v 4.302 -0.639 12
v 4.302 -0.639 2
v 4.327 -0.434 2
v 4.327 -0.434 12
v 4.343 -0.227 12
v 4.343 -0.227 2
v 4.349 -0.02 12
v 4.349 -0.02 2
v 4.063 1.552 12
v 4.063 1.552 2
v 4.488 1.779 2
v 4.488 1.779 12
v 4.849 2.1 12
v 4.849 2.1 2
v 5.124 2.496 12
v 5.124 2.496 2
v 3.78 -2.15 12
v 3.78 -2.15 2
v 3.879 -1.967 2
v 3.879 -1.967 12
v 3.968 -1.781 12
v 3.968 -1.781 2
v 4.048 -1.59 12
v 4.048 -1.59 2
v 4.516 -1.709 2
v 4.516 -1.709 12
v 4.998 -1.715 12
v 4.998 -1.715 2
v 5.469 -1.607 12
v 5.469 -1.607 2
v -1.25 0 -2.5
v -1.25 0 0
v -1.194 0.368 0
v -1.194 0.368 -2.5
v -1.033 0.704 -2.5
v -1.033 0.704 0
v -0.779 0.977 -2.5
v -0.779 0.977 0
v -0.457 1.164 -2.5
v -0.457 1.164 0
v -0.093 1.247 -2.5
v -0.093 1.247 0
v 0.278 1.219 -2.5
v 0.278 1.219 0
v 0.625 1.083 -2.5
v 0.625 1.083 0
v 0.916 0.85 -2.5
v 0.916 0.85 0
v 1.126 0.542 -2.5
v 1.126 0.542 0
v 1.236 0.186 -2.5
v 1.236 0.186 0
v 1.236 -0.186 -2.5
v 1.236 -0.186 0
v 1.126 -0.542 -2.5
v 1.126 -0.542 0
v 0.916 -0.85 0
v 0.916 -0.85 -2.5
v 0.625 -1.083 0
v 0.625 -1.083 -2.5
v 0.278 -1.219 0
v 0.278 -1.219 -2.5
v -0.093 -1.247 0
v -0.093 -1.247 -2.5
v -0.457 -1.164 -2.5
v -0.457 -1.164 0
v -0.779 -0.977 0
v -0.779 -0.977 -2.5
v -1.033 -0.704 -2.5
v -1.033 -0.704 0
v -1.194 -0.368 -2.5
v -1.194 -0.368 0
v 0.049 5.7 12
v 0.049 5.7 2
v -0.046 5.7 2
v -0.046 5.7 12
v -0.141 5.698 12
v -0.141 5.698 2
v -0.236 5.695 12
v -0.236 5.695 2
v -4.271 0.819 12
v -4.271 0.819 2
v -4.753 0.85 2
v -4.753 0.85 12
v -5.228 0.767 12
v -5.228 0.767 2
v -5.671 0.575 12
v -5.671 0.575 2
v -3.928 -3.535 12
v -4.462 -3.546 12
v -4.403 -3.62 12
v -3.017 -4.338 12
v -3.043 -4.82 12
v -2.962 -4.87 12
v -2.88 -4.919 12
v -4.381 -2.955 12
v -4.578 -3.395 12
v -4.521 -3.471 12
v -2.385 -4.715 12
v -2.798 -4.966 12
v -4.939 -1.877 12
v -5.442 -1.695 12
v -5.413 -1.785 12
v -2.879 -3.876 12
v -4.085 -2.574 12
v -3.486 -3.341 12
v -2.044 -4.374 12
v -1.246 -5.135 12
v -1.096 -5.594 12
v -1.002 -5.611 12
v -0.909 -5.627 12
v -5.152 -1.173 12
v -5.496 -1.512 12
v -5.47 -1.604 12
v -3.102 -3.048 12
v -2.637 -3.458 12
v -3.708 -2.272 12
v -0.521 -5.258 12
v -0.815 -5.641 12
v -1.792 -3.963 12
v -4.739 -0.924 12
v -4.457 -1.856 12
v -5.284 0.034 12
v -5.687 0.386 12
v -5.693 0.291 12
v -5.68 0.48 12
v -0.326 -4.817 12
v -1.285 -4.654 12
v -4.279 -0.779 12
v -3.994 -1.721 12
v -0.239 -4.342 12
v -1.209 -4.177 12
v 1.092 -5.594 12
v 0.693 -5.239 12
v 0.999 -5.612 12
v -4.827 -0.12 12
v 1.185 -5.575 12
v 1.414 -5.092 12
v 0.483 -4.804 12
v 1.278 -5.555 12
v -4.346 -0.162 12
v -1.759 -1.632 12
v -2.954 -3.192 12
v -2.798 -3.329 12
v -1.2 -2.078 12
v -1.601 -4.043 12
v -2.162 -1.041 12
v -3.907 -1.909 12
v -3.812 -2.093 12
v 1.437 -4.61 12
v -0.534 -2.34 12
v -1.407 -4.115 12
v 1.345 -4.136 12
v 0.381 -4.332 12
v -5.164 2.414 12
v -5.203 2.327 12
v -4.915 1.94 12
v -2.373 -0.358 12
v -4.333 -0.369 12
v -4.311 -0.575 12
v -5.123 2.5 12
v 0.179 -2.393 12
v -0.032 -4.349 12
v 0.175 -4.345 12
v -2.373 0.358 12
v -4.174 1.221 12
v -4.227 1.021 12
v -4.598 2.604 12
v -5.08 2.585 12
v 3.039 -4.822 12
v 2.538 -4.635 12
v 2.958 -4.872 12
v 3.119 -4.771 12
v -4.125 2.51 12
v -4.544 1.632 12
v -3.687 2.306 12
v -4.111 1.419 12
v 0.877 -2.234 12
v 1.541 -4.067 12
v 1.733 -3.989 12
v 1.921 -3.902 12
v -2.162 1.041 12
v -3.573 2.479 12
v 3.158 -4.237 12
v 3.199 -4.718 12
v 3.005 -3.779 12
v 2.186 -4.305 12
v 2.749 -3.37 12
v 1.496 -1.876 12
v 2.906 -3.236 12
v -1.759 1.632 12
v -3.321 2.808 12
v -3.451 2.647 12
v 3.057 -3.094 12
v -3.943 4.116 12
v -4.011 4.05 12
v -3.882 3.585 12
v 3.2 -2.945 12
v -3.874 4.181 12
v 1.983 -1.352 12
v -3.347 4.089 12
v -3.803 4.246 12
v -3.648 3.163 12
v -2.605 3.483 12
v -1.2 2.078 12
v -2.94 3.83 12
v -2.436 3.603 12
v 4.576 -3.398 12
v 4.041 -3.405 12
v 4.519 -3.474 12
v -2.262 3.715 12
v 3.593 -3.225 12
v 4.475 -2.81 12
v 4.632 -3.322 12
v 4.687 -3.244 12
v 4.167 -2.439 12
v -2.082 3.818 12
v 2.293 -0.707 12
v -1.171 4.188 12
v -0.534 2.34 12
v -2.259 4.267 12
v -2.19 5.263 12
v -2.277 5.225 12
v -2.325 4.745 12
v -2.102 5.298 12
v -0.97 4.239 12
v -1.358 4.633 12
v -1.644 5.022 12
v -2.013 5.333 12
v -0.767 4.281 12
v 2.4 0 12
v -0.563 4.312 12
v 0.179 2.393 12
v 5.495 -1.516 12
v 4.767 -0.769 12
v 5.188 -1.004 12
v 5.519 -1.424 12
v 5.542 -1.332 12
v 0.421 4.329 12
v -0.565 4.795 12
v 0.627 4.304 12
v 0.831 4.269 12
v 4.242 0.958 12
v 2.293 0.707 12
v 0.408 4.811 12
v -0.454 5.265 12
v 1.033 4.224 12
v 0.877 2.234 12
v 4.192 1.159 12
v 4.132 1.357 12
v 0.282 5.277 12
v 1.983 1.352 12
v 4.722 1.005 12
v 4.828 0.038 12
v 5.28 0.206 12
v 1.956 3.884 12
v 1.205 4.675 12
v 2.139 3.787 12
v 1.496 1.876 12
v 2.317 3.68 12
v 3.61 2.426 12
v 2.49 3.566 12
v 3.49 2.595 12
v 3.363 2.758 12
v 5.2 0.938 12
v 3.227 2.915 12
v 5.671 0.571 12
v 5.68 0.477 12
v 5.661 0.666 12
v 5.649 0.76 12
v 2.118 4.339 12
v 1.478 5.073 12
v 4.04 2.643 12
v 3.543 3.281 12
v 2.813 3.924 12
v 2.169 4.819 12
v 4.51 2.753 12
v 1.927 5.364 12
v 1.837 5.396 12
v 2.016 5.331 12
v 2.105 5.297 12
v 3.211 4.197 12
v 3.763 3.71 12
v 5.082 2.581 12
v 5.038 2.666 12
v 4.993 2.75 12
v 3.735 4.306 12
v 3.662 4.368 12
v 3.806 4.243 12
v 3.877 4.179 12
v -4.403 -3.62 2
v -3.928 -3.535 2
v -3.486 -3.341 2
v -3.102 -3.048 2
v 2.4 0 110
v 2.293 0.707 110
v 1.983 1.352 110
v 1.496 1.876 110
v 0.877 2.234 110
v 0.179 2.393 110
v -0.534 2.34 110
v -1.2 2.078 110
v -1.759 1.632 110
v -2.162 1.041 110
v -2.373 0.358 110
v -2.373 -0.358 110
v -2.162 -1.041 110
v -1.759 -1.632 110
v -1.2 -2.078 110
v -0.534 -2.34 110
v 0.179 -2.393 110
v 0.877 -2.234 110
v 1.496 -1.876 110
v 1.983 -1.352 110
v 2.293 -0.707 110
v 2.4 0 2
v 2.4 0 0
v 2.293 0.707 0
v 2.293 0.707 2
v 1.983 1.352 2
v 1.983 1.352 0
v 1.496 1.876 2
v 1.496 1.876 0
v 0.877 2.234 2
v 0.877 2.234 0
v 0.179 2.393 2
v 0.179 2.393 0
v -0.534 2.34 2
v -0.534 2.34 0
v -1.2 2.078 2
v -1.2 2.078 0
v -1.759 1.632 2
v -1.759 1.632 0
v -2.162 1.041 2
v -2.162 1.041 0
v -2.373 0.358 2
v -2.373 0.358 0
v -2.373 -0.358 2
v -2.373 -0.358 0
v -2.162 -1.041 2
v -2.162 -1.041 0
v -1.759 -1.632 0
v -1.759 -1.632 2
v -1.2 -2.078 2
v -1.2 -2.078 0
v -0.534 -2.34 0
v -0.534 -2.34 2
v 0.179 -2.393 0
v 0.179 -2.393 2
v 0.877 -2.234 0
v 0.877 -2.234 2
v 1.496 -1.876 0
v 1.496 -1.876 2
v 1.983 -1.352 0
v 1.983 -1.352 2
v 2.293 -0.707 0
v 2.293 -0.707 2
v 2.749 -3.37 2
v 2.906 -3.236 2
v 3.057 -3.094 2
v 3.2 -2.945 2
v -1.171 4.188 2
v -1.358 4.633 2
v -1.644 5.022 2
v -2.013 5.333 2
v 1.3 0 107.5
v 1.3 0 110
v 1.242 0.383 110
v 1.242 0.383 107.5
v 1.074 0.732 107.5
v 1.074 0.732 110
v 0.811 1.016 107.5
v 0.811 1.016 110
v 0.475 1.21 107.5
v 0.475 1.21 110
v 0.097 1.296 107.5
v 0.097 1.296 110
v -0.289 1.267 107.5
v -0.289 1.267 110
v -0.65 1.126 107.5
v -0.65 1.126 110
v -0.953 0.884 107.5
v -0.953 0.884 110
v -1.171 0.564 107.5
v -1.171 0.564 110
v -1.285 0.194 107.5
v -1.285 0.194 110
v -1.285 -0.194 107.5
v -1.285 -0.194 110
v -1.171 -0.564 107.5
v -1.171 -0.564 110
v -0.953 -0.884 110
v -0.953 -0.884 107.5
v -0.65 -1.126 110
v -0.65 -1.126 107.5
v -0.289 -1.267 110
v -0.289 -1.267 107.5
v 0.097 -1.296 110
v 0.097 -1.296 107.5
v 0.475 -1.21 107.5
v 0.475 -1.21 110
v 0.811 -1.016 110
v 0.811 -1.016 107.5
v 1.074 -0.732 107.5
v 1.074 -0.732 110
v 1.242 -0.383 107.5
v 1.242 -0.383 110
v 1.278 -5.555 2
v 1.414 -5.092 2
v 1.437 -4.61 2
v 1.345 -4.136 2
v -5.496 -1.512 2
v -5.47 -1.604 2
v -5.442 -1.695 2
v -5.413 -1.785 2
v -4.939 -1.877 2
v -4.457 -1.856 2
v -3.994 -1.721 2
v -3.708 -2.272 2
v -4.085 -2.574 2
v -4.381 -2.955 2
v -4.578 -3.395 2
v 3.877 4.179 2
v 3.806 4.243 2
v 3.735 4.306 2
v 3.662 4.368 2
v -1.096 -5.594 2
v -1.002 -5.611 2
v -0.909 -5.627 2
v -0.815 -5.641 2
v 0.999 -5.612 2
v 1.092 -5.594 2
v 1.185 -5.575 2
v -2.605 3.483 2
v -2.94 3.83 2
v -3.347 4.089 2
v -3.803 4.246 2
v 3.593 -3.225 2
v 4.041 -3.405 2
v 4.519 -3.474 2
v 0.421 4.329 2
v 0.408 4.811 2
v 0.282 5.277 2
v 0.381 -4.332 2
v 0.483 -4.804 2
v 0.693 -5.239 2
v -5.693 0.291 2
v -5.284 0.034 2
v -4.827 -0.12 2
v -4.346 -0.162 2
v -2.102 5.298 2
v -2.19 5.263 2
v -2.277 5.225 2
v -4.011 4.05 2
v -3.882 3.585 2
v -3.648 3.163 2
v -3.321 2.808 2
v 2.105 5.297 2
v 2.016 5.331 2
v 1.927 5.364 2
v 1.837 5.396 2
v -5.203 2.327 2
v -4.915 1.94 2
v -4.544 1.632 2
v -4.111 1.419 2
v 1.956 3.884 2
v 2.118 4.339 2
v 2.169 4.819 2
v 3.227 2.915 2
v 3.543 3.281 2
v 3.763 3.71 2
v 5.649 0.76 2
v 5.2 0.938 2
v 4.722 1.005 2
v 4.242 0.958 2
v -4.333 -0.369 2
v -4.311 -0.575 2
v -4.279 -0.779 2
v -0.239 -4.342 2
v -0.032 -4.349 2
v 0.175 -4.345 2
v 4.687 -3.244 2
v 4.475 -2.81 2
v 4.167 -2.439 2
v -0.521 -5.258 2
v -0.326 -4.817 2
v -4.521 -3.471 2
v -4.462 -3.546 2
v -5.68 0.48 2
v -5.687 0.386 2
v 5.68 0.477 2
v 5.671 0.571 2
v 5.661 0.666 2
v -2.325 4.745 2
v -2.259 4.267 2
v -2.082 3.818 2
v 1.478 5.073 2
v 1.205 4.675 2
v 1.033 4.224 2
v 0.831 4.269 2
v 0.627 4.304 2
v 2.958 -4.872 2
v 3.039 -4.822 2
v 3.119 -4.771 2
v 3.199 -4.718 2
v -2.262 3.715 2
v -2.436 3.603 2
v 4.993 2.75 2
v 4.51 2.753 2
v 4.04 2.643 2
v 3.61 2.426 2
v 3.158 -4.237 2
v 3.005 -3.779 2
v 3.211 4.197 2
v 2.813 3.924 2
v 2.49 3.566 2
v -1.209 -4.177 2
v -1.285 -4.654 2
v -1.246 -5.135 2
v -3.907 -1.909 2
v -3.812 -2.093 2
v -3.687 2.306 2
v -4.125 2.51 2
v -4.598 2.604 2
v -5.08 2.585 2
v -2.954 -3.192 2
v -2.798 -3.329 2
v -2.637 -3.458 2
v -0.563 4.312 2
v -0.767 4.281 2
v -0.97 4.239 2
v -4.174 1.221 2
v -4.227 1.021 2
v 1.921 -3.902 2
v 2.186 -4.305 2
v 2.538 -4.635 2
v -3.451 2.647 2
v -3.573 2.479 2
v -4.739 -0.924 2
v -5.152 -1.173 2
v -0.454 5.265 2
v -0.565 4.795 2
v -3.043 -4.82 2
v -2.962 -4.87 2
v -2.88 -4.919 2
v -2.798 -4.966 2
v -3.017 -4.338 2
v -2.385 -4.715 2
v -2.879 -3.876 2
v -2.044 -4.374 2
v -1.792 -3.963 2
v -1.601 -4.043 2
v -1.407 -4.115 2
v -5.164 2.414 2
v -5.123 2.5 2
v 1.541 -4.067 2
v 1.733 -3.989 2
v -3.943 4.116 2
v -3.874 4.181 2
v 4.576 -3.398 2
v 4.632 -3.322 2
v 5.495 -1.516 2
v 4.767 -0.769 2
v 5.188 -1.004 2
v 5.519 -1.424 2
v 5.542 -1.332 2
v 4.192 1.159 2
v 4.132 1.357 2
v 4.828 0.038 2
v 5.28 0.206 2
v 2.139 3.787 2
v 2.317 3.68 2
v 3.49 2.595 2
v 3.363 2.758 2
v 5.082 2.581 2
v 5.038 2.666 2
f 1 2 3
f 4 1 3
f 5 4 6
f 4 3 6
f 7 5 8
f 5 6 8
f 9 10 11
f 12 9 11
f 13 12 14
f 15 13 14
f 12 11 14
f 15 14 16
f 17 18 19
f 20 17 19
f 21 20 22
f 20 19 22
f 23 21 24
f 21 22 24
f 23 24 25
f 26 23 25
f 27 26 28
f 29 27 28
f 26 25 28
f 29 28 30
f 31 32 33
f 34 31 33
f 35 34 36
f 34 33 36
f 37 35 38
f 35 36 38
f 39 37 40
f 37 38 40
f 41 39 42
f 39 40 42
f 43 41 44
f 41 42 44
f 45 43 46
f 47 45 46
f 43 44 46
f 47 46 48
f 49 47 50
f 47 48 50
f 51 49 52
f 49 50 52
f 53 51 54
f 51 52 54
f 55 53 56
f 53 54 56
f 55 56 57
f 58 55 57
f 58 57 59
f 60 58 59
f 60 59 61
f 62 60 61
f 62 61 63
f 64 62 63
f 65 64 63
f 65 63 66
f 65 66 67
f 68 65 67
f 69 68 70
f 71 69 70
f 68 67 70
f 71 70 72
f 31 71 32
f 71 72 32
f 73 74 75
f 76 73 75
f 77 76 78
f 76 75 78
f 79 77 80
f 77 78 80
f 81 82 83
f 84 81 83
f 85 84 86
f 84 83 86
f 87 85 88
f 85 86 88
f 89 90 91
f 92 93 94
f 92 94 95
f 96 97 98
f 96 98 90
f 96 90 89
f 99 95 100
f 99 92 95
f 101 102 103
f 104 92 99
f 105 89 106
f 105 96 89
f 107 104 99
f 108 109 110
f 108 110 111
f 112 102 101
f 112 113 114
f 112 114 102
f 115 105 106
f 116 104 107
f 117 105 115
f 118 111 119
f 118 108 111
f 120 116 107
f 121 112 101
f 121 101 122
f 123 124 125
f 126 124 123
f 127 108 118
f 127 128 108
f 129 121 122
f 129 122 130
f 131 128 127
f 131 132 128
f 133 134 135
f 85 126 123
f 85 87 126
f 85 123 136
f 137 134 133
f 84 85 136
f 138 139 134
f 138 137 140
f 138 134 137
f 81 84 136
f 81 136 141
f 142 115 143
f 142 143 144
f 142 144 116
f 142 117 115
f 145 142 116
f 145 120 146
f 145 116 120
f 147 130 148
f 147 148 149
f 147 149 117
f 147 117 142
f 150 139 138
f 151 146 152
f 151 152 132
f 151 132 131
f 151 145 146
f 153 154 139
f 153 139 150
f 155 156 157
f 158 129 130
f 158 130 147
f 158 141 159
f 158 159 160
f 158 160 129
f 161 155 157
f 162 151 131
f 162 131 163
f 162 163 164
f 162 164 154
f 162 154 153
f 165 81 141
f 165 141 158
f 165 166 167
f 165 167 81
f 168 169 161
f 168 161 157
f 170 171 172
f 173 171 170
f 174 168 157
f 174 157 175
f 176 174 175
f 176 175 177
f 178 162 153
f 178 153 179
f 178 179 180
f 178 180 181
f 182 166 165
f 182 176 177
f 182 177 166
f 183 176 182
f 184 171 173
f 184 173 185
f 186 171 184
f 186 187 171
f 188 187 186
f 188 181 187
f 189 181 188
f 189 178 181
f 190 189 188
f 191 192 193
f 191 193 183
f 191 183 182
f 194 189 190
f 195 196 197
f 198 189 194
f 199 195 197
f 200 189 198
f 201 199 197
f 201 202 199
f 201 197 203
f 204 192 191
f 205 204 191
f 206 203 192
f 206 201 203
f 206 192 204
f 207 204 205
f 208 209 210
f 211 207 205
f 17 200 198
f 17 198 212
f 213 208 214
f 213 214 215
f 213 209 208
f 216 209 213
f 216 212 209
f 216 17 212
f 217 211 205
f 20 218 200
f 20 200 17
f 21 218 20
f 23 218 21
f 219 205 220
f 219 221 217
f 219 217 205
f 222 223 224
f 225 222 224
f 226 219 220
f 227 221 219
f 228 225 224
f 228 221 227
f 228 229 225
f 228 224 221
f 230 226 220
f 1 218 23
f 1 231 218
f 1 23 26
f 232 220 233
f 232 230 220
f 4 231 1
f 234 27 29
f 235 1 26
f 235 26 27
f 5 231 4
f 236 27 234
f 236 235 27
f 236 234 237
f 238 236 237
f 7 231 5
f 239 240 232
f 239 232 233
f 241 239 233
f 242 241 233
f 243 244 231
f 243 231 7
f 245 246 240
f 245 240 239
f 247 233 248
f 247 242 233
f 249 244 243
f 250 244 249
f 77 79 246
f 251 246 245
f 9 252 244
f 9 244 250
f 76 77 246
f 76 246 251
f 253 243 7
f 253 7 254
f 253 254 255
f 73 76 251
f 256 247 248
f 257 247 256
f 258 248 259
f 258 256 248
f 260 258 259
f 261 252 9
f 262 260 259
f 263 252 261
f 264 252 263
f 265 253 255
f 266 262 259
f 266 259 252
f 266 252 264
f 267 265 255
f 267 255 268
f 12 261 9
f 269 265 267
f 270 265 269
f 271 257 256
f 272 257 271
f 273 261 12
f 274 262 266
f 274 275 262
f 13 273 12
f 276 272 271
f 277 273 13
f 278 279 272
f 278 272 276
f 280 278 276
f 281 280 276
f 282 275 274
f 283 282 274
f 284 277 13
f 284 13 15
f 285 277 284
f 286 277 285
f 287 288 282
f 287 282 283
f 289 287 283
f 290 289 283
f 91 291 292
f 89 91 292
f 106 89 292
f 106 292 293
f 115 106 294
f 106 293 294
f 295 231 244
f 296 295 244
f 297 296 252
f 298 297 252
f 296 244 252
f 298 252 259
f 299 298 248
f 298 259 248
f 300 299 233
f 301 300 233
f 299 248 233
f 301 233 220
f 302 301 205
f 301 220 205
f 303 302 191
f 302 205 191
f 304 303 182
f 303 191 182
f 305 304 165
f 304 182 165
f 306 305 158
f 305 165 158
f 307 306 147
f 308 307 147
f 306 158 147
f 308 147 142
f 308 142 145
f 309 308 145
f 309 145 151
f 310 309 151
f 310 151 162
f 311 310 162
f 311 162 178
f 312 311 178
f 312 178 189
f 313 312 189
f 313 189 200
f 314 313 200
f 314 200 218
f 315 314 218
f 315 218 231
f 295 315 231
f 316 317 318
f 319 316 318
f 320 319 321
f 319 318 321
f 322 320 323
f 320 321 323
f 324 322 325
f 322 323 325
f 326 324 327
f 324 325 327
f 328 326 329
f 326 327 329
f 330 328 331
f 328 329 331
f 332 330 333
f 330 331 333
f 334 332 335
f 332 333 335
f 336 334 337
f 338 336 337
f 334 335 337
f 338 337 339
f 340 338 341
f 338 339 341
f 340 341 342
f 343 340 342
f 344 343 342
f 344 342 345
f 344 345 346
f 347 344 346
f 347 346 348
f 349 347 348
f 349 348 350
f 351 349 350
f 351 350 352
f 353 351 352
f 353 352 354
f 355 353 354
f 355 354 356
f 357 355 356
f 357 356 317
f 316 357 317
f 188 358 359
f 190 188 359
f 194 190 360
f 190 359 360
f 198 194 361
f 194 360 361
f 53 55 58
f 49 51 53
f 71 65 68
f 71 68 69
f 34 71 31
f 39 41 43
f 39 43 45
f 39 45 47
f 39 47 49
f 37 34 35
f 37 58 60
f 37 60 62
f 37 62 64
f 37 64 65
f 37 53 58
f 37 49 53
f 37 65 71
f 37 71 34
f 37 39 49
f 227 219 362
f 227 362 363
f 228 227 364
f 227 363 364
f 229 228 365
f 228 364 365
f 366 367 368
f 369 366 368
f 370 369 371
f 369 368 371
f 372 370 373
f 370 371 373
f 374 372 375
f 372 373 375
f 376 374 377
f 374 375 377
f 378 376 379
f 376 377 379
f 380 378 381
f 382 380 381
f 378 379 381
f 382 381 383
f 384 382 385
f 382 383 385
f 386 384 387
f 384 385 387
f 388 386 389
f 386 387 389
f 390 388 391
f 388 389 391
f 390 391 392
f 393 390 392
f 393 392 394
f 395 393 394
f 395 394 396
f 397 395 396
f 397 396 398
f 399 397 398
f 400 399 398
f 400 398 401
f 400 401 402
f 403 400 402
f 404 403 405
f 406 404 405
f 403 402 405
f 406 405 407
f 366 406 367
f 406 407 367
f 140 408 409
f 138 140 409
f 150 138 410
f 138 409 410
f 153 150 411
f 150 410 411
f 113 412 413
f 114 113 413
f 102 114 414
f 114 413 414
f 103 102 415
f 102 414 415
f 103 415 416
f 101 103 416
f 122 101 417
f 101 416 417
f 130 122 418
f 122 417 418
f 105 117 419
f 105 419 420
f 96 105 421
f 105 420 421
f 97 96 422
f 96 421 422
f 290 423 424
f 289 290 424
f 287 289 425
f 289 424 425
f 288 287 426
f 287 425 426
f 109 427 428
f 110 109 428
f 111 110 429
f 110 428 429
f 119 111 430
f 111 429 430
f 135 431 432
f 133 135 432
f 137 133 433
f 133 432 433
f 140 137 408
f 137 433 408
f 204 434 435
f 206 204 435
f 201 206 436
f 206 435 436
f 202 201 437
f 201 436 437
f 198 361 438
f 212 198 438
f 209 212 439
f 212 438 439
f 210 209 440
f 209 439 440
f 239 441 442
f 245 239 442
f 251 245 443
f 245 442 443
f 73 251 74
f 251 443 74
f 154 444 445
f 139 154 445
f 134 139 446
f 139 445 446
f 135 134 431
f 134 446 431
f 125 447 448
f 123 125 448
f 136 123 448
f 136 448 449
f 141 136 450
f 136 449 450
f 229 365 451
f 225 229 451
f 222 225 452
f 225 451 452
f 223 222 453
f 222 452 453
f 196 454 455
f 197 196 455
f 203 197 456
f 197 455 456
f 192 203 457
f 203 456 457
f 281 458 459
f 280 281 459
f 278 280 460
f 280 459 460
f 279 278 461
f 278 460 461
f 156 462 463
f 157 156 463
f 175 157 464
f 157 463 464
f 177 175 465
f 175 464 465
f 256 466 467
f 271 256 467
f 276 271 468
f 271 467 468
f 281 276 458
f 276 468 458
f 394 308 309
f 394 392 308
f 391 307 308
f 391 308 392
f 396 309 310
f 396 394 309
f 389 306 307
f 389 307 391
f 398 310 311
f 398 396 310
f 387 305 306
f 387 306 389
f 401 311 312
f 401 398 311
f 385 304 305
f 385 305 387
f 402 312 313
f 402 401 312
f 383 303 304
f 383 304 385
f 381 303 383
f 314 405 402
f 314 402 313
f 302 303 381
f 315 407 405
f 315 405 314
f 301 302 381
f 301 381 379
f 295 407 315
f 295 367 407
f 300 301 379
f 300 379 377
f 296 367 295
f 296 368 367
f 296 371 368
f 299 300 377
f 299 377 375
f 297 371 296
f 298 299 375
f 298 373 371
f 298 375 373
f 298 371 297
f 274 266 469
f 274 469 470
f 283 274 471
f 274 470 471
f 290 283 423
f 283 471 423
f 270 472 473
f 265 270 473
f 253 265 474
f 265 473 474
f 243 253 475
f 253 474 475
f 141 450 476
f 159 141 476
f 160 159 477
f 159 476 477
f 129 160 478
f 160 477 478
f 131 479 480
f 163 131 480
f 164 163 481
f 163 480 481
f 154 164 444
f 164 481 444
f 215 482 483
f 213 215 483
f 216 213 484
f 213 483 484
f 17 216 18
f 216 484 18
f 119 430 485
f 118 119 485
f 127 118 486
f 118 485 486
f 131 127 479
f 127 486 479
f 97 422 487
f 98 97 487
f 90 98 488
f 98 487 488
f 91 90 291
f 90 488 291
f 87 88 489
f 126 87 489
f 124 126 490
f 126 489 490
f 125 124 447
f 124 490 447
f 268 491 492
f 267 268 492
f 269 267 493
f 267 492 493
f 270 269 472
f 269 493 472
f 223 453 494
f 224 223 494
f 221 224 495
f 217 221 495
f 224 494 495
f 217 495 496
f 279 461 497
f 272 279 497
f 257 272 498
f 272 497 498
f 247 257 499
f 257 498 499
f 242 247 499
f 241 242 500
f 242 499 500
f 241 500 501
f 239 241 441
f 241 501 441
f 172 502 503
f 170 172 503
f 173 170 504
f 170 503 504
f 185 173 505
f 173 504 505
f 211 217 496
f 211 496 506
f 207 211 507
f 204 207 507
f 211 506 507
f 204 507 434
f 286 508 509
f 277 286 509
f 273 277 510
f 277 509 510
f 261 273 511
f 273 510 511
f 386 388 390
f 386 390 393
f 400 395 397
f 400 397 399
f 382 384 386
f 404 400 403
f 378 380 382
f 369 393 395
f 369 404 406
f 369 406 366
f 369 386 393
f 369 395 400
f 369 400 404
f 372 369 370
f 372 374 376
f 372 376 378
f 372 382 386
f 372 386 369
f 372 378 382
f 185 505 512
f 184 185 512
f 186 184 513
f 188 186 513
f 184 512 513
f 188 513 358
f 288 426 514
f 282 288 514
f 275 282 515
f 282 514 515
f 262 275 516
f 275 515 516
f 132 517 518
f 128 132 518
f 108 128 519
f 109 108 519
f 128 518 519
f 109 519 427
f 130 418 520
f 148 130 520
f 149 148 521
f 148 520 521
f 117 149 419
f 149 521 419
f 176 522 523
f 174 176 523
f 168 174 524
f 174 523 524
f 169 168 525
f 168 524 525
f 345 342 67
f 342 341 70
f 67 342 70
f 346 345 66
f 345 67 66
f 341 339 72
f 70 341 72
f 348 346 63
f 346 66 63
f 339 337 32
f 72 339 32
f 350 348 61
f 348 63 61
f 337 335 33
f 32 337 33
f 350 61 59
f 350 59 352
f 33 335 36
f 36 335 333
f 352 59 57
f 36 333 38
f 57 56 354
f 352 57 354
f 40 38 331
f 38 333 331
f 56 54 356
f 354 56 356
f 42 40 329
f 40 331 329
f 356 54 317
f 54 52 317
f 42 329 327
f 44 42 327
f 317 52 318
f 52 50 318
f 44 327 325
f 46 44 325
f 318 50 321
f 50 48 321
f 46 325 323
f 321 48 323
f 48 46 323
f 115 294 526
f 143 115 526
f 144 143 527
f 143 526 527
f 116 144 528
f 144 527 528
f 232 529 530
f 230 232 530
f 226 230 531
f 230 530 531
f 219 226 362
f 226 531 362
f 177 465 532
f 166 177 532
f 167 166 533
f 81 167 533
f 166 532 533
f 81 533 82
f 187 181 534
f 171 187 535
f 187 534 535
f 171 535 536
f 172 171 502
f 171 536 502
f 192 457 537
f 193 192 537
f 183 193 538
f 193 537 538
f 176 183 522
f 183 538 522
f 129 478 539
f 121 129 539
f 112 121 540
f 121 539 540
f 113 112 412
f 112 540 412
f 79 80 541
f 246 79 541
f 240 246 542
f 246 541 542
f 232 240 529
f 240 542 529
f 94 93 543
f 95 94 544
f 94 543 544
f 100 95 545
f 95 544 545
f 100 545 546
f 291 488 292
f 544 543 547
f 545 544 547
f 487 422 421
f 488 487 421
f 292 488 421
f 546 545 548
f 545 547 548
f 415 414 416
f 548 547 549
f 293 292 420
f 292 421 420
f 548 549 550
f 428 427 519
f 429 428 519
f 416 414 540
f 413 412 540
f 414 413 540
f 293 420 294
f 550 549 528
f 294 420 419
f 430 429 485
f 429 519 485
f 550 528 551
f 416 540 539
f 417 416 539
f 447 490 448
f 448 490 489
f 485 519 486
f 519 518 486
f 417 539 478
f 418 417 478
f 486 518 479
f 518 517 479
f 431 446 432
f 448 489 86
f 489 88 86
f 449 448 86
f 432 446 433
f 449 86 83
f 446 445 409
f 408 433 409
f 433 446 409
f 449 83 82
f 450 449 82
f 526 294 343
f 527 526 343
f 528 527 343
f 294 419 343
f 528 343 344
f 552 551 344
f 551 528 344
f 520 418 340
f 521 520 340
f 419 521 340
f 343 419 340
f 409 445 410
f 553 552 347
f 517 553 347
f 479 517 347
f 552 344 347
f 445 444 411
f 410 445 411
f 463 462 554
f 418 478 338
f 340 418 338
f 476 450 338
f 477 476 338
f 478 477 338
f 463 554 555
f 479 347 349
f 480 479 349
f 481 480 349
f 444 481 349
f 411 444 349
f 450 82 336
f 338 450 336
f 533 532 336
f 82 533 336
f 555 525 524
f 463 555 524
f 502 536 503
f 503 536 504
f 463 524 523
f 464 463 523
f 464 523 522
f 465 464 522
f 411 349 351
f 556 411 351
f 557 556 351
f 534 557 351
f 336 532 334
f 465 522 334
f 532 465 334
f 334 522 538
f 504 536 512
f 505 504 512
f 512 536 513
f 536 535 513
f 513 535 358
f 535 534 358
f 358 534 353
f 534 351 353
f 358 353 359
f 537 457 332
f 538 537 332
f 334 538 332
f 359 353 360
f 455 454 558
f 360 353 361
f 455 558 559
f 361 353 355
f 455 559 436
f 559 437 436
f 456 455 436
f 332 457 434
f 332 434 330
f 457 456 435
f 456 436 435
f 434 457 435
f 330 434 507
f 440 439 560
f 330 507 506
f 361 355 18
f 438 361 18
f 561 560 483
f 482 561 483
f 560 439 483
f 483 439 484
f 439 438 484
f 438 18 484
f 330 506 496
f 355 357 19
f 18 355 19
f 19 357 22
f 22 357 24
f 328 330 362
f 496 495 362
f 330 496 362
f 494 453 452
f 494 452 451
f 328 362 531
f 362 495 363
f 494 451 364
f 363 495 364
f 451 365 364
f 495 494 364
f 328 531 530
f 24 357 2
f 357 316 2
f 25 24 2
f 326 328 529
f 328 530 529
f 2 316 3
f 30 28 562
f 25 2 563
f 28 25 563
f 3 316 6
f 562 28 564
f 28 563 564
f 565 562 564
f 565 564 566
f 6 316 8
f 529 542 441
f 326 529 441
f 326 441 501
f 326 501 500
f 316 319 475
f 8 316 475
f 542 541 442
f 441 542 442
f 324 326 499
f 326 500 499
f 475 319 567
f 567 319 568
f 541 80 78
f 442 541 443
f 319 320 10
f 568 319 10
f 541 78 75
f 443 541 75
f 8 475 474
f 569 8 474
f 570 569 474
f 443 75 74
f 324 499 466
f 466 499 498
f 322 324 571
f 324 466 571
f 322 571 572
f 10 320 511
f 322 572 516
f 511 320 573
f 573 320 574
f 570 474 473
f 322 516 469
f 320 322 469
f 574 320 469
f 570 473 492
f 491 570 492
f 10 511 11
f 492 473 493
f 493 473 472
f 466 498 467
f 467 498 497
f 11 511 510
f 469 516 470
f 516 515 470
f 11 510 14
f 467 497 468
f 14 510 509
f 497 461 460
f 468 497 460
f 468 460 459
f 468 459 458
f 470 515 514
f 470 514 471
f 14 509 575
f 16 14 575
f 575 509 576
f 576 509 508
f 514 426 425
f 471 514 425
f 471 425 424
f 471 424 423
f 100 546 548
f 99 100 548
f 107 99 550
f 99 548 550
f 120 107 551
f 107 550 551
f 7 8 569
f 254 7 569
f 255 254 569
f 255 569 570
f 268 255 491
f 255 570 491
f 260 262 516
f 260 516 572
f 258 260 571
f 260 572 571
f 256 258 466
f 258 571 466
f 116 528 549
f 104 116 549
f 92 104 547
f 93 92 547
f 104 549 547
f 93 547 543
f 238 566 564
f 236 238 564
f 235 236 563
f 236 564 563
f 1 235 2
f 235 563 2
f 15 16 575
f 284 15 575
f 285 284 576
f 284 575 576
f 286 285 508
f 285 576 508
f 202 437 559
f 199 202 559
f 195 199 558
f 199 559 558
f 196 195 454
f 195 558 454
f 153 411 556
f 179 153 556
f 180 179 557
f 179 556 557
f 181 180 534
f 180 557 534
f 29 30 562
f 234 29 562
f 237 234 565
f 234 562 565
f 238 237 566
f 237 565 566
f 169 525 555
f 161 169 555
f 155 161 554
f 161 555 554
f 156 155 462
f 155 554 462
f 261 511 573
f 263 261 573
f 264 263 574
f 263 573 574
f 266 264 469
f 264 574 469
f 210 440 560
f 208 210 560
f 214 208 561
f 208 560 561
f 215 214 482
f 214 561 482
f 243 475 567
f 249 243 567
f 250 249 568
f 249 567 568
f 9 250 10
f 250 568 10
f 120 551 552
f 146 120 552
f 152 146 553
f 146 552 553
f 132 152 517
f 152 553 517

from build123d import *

# Parameters (mm, degrees)
SKETCH1_R           = 2.4
BOSS_EXTRUDE1_DEPTH = 110
SKETCH6_R           = 1.25
BOSS_EXTRUDE2_DEPTH = 2.5
SKETCH7_R           = 1.3
CUT_EXTRUDE1_DEPTH  = 2.5
JOIN1_START         = 2
JOIN1_OUTLINE_R     = 2.4
JOIN1_DEPTH         = 10


# Read off the part's stored shape, not the designer's step: Join1
with BuildPart() as part:
    # Sketch1 → Boss-Extrude1 (new body)
    with BuildSketch(Plane.XY):
        Circle(SKETCH1_R)
    extrude(amount=BOSS_EXTRUDE1_DEPTH)

    # Sketch6 → Boss-Extrude2 (add)
    with BuildSketch(Plane(origin=(0, 0, 0), x_dir=(-1, 0, 0), z_dir=(0, 0, -1))):
        Circle(SKETCH6_R)
    extrude(amount=BOSS_EXTRUDE2_DEPTH)

    # Sketch7 → Cut-Extrude1 (cut)
    with BuildSketch(Plane.XY.offset(110)):
        Circle(SKETCH7_R)
    extrude(amount=-CUT_EXTRUDE1_DEPTH, mode=Mode.SUBTRACT)

    # Join1 outline → Join1 (add)
    with BuildSketch(Plane.XY.offset(JOIN1_START)):
        with BuildLine():
            ThreePointArc((-3.708118179, -2.272368933), (-4.244159788, -2.755671749), (-4.578357083, -3.395386049))
            ThreePointArc((-4.578357083, -3.395386049), (-4.491909089, -3.508953224), (-4.402644734, -3.620320337))
            ThreePointArc((-4.402644734, -3.620320337), (-3.701059107, -3.450910109), (-3.102375311, -3.047797308))
            ThreePointArc((-3.102375311, -3.047797308), (-2.876945397, -3.261439281), (-2.636842886, -3.458447715))
            ThreePointArc((-2.636842886, -3.458447715), (-2.962097686, -4.102754733), (-3.042635922, -4.81999654))
            ThreePointArc((-3.042635922, -4.81999654), (-2.921000374, -4.89466616), (-2.7975334, -4.966266895))
            ThreePointArc((-2.7975334, -4.966266895), (-2.204522319, -4.554854601), (-1.791887445, -3.962693577))
            ThreePointArc((-1.791887445, -3.962693577), (-1.504503928, -4.080474106), (-1.20944735, -4.177443968))
            ThreePointArc((-1.20944735, -4.177443968), (-1.279987877, -4.895737955), (-1.095989921, -5.593639789))
            ThreePointArc((-1.095989921, -5.593639789), (-0.955594371, -5.619327308), (-0.814599678, -5.64149159))
            ThreePointArc((-0.814599678, -5.64149159), (-0.410252576, -5.04364074), (-0.239395251, -4.34240612))
            ThreePointArc((-0.239395251, -4.34240612), (0.071129132, -4.348418292), (0.381290753, -4.332253266))
            ThreePointArc((0.381290753, -4.332253266), (0.574991387, -5.027524639), (0.998675593, -5.61183099))
            ThreePointArc((0.998675593, -5.61183099), (1.138869946, -5.585067166), (1.278350244, -5.554801585))
            ThreePointArc((1.278350244, -5.554801585), (1.439424051, -4.851255249), (1.345428599, -4.135652655))
            ThreePointArc((1.345428599, -4.135652655), (1.63715581, -4.029084493), (1.920533427, -3.901967754))
            ThreePointArc((1.920533427, -3.901967754), (2.352314878, -4.480316262), (2.958464434, -4.872113319))
            ThreePointArc((2.958464434, -4.872113319), (3.079523566, -4.796512755), (3.198651882, -4.717904846))
            ThreePointArc((3.198651882, -4.717904846), (3.094698483, -4.003680856), (2.748544861, -3.370356383))
            ThreePointArc((2.748544861, -3.370356383), (2.982075524, -3.165600507), (3.200397419, -2.944699876))
            ThreePointArc((3.200397419, -2.944699876), (3.81194521, -3.328016348), (4.518696259, -3.474389747))
            ThreePointArc((4.518696259, -3.474389747), (4.604270465, -3.360162718), (4.686957859, -3.243828915))
            ThreePointArc((4.686957859, -3.243828915), (4.332016737, -2.615387177), (3.78045491, -2.149874805))
            ThreePointArc((3.78045491, -2.149874805), (3.924249414, -1.874584632), (4.048030006, -1.589733962))
            ThreePointArc((4.048030006, -1.589733962), (4.756751219, -1.726249384), (5.468653116, -1.607430588))
            ThreePointArc((5.468653116, -1.607430588), (5.507185124, -1.470004087), (5.542264206, -1.331655914))
            ThreePointArc((5.542264206, -1.331655914), (4.984272126, -0.873870968), (4.301793574, -0.639040722))
            ThreePointArc((4.301793574, -0.639040722), (4.336431675, -0.330395714), (4.34895371, -0.020065668))
            ThreePointArc((4.34895371, -0.020065668), (5.059131618, 0.108657124), (5.680038067, 0.47662098))
            ThreePointArc((5.680038067, 0.47662098), (5.666323915, 0.618686743), (5.649057061, 0.760364598))
            ThreePointArc((5.649057061, 0.760364598), (4.963373946, 0.985666358), (4.24215118, 0.958099352))
            ThreePointArc((4.24215118, 0.958099352), (4.16295481, 1.258414976), (4.062527116, 1.552312606))
            ThreePointArc((4.062527116, 1.552312606), (4.678248257, 1.928888885), (5.124302402, 2.496302243))
            ThreePointArc((5.124302402, 2.496302243), (5.060194264, 2.623820499), (4.992913458, 2.749693657))
            ThreePointArc((4.992913458, 2.749693657), (4.272144611, 2.71208398), (3.609582762, 2.425842799))
            ThreePointArc((3.609582762, 2.425842799), (3.42724783, 2.67726975), (3.227433725, 2.915042461))
            ThreePointArc((3.227433725, 2.915042461), (3.665541547, 3.488613515), (3.876501304, 4.178844056))
            ThreePointArc((3.876501304, 4.178844056), (3.770657338, 4.274592757), (3.662449225, 4.367661351))
            ThreePointArc((3.662449225, 4.367661351), (3.003938474, 4.072219633), (2.48952019, 3.565962734))
            ThreePointArc((2.48952019, 3.565962734), (2.228672039, 3.734544409), (1.956457525, 3.884079679))
            ThreePointArc((1.956457525, 3.884079679), (2.15778314, 4.577181558), (2.105157224, 5.297009823))
            ThreePointArc((2.105157224, 5.297009823), (1.971872245, 5.348057577), (1.83735093, 5.395752177))
            ThreePointArc((1.83735093, 5.395752177), (1.3300338, 4.882379459), (1.033234122, 4.224479642))
            ThreePointArc((1.033234122, 4.224479642), (0.72910174, 4.287448152), (0.421250895, 4.328550414))
            ThreePointArc((0.421250895, 4.328550414), (0.358604163, 5.047575869), (0.049499995, 5.699785062))
            ThreePointArc((0.049499995, 5.699785062), (-0.093225122, 5.699237587), (-0.235891789, 5.695116774))
            ThreePointArc((-0.235891789, 5.695116774), (-0.523499308, 5.033146885), (-0.562595939, 4.312457166))
            ThreePointArc((-0.562595939, 4.312457166), (-0.868937788, 4.261308264), (-1.170848002, 4.18842643))
            ThreePointArc((-1.170848002, 4.18842643), (-1.489006294, 4.836267088), (-2.012842482, 5.332772744))
            ThreePointArc((-2.012842482, 5.332772744), (-2.14573192, 5.28070398), (-2.277276015, 5.225324292))
            ThreePointArc((-2.277276015, 5.225324292), (-2.306330934, 4.504159935), (-2.082444302, 3.818013453))
            ThreePointArc((-2.082444302, 3.818013453), (-2.349622454, 3.659655082), (-2.604817389, 3.482632247))
            ThreePointArc((-2.604817389, 3.482632247), (-3.1355182, 3.971793639), (-3.803339428, 4.245539918))
            ThreePointArc((-3.803339428, 4.245539918), (-3.908445731, 4.14898204), (-4.011101496, 4.04982281))
            ThreePointArc((-4.011101496, 4.04982281), (-3.777679787, 3.366861227), (-3.321047022, 2.807925868))
            ThreePointArc((-3.321047022, 2.807925868), (-3.512977588, 2.563745203), (-3.686991754, 2.306489282))
            ThreePointArc((-3.686991754, 2.306489282), (-4.358560998, 2.570907451), (-5.080174309, 2.584923401))
            ThreePointArc((-5.080174309, 2.584923401), (-5.14330229, 2.456917084), (-5.203205494, 2.327370316))
            ThreePointArc((-5.203205494, 2.327370316), (-4.738832052, 1.774849254), (-4.111123939, 1.418612334))
            ThreePointArc((-4.111123939, 1.418612334), (-4.201885632, 1.121587328), (-4.271217452, 0.818842159))
            ThreePointArc((-4.271217452, 0.818842159), (-4.992955982, 0.822805965), (-5.6709035, 0.575198654))
            ThreePointArc((-5.6709035, 0.575198654), (-5.683527374, 0.433031862), (-5.692587758, 0.290593566))
            ThreePointArc((-5.692587758, 0.290593566), (-5.05997879, -0.056865946), (-4.345970788, -0.162292656))
            ThreePointArc((-4.345970788, -0.162292656), (-4.323305738, -0.472047131), (-4.278591565, -0.779394136))
            ThreePointArc((-4.278591565, -0.779394136), (-4.953024594, -1.036420026), (-5.49574575, -1.512209858))
            ThreePointArc((-5.49574575, -1.512209858), (-5.456160592, -1.649336712), (-5.413154501, -1.785429457))
            ThreePointArc((-5.413154501, -1.785429457), (-4.697747354, -1.880901084), (-3.993870201, -1.721279124))
            ThreePointArc((-3.993870201, -1.721279124), (-3.860839448, -2.001929008), (-3.708118179, -2.272368933))
        make_face()
        Circle(JOIN1_OUTLINE_R, mode=Mode.SUBTRACT)
    extrude(amount=JOIN1_DEPTH)


solid = part.part
